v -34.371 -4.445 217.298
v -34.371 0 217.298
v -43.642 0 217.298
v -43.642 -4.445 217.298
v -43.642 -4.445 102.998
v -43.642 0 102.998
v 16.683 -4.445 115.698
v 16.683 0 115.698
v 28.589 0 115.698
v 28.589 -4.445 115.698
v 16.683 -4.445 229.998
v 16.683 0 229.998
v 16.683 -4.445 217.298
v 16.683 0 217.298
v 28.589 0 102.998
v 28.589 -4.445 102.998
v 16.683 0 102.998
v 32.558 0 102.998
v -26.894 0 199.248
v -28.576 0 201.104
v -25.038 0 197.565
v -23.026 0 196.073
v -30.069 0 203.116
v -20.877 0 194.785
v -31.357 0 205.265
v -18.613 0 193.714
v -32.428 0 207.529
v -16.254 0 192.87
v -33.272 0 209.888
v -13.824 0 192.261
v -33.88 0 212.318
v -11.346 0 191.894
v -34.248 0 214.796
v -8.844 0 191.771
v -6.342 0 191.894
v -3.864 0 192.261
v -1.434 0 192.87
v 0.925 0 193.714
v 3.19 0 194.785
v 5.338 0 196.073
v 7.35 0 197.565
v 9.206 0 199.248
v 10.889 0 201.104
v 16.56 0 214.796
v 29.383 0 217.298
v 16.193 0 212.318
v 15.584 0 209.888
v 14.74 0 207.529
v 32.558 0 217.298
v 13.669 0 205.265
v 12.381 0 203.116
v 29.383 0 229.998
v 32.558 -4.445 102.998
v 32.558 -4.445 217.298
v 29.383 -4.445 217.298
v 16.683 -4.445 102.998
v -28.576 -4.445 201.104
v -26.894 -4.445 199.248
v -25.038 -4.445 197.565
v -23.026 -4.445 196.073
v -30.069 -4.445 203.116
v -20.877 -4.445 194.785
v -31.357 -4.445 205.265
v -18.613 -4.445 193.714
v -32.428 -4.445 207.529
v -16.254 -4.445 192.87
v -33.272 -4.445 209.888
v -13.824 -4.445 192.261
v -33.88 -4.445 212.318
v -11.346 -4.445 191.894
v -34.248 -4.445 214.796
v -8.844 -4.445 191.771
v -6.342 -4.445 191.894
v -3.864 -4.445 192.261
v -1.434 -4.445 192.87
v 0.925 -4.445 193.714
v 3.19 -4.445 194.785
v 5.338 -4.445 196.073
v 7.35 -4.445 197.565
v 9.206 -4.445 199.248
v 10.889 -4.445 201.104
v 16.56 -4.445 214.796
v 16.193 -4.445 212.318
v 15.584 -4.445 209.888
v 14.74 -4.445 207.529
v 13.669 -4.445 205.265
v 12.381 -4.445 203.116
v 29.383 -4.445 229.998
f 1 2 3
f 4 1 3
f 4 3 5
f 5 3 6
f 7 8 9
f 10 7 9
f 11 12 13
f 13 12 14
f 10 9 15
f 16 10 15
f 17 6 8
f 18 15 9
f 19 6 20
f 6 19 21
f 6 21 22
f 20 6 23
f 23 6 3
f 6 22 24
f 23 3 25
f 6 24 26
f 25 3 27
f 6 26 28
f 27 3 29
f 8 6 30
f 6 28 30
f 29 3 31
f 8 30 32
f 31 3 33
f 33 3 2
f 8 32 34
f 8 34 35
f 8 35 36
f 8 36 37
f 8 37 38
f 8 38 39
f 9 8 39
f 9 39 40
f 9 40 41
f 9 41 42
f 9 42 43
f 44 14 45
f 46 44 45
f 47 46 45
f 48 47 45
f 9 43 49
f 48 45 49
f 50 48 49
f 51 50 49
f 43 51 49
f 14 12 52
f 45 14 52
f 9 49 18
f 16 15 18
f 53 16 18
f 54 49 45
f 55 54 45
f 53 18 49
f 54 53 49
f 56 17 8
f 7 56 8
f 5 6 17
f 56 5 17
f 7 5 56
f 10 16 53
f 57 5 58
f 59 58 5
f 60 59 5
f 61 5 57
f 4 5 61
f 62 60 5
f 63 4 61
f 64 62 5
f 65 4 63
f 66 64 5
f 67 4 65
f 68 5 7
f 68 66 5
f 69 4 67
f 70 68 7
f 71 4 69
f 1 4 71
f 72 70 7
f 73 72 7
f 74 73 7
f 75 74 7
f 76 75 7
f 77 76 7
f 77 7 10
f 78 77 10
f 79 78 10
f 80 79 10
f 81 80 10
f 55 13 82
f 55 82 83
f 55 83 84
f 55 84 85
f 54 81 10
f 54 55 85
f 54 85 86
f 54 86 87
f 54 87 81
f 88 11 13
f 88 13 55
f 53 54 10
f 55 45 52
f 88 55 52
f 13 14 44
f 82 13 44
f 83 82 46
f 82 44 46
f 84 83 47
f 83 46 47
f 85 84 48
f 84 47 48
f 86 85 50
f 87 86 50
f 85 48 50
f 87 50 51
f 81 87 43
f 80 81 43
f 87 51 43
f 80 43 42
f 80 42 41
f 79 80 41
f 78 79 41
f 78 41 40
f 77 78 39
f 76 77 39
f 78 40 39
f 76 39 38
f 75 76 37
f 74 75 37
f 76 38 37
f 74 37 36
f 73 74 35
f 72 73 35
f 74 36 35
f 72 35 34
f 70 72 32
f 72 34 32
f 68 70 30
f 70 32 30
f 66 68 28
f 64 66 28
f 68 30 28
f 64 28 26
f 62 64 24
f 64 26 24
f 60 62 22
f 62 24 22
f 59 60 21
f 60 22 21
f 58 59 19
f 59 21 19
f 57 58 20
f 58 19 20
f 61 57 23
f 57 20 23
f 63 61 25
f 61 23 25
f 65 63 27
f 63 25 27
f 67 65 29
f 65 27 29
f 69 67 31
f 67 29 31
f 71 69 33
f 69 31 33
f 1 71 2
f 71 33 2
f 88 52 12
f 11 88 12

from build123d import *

# Parameters (mm, degrees)
F1_DEPTH = 4.445


with BuildPart() as f1:
    # F0 (on Front) → F1 (new body)
    with BuildSketch(Plane.XZ):
        with BuildLine():
            Line((-34.370821, 217.297887), (-43.641821, 217.297887))
            Line((-43.641821, 217.297887), (-43.641821, 102.997887))
            Line((-43.641821, 102.997887), (16.683179, 102.997887))
            Line((16.683179, 102.997887), (16.683179, 115.697887))
            Line((16.683179, 115.697887), (28.589429, 115.697887))
            Line((28.589429, 115.697887), (28.589429, 102.997887))
            Line((28.589429, 102.997887), (29.383179, 102.997887))
            Line((29.383179, 102.997887), (32.558179, 102.997887))
            Line((32.558179, 102.997887), (32.558179, 217.297887))
            Line((32.558179, 217.297887), (29.383179, 217.297887))
            Line((29.383179, 217.297887), (29.383179, 229.997887))
            Line((29.383179, 229.997887), (16.683179, 229.997887))
            Line((16.683179, 229.997887), (16.683179, 217.297887))
            ThreePointArc((16.683179, 217.297887), (-8.843821, 191.770887), (-34.370821, 217.297887))
        make_face()
    extrude(amount=F1_DEPTH)


solid = f1.part
